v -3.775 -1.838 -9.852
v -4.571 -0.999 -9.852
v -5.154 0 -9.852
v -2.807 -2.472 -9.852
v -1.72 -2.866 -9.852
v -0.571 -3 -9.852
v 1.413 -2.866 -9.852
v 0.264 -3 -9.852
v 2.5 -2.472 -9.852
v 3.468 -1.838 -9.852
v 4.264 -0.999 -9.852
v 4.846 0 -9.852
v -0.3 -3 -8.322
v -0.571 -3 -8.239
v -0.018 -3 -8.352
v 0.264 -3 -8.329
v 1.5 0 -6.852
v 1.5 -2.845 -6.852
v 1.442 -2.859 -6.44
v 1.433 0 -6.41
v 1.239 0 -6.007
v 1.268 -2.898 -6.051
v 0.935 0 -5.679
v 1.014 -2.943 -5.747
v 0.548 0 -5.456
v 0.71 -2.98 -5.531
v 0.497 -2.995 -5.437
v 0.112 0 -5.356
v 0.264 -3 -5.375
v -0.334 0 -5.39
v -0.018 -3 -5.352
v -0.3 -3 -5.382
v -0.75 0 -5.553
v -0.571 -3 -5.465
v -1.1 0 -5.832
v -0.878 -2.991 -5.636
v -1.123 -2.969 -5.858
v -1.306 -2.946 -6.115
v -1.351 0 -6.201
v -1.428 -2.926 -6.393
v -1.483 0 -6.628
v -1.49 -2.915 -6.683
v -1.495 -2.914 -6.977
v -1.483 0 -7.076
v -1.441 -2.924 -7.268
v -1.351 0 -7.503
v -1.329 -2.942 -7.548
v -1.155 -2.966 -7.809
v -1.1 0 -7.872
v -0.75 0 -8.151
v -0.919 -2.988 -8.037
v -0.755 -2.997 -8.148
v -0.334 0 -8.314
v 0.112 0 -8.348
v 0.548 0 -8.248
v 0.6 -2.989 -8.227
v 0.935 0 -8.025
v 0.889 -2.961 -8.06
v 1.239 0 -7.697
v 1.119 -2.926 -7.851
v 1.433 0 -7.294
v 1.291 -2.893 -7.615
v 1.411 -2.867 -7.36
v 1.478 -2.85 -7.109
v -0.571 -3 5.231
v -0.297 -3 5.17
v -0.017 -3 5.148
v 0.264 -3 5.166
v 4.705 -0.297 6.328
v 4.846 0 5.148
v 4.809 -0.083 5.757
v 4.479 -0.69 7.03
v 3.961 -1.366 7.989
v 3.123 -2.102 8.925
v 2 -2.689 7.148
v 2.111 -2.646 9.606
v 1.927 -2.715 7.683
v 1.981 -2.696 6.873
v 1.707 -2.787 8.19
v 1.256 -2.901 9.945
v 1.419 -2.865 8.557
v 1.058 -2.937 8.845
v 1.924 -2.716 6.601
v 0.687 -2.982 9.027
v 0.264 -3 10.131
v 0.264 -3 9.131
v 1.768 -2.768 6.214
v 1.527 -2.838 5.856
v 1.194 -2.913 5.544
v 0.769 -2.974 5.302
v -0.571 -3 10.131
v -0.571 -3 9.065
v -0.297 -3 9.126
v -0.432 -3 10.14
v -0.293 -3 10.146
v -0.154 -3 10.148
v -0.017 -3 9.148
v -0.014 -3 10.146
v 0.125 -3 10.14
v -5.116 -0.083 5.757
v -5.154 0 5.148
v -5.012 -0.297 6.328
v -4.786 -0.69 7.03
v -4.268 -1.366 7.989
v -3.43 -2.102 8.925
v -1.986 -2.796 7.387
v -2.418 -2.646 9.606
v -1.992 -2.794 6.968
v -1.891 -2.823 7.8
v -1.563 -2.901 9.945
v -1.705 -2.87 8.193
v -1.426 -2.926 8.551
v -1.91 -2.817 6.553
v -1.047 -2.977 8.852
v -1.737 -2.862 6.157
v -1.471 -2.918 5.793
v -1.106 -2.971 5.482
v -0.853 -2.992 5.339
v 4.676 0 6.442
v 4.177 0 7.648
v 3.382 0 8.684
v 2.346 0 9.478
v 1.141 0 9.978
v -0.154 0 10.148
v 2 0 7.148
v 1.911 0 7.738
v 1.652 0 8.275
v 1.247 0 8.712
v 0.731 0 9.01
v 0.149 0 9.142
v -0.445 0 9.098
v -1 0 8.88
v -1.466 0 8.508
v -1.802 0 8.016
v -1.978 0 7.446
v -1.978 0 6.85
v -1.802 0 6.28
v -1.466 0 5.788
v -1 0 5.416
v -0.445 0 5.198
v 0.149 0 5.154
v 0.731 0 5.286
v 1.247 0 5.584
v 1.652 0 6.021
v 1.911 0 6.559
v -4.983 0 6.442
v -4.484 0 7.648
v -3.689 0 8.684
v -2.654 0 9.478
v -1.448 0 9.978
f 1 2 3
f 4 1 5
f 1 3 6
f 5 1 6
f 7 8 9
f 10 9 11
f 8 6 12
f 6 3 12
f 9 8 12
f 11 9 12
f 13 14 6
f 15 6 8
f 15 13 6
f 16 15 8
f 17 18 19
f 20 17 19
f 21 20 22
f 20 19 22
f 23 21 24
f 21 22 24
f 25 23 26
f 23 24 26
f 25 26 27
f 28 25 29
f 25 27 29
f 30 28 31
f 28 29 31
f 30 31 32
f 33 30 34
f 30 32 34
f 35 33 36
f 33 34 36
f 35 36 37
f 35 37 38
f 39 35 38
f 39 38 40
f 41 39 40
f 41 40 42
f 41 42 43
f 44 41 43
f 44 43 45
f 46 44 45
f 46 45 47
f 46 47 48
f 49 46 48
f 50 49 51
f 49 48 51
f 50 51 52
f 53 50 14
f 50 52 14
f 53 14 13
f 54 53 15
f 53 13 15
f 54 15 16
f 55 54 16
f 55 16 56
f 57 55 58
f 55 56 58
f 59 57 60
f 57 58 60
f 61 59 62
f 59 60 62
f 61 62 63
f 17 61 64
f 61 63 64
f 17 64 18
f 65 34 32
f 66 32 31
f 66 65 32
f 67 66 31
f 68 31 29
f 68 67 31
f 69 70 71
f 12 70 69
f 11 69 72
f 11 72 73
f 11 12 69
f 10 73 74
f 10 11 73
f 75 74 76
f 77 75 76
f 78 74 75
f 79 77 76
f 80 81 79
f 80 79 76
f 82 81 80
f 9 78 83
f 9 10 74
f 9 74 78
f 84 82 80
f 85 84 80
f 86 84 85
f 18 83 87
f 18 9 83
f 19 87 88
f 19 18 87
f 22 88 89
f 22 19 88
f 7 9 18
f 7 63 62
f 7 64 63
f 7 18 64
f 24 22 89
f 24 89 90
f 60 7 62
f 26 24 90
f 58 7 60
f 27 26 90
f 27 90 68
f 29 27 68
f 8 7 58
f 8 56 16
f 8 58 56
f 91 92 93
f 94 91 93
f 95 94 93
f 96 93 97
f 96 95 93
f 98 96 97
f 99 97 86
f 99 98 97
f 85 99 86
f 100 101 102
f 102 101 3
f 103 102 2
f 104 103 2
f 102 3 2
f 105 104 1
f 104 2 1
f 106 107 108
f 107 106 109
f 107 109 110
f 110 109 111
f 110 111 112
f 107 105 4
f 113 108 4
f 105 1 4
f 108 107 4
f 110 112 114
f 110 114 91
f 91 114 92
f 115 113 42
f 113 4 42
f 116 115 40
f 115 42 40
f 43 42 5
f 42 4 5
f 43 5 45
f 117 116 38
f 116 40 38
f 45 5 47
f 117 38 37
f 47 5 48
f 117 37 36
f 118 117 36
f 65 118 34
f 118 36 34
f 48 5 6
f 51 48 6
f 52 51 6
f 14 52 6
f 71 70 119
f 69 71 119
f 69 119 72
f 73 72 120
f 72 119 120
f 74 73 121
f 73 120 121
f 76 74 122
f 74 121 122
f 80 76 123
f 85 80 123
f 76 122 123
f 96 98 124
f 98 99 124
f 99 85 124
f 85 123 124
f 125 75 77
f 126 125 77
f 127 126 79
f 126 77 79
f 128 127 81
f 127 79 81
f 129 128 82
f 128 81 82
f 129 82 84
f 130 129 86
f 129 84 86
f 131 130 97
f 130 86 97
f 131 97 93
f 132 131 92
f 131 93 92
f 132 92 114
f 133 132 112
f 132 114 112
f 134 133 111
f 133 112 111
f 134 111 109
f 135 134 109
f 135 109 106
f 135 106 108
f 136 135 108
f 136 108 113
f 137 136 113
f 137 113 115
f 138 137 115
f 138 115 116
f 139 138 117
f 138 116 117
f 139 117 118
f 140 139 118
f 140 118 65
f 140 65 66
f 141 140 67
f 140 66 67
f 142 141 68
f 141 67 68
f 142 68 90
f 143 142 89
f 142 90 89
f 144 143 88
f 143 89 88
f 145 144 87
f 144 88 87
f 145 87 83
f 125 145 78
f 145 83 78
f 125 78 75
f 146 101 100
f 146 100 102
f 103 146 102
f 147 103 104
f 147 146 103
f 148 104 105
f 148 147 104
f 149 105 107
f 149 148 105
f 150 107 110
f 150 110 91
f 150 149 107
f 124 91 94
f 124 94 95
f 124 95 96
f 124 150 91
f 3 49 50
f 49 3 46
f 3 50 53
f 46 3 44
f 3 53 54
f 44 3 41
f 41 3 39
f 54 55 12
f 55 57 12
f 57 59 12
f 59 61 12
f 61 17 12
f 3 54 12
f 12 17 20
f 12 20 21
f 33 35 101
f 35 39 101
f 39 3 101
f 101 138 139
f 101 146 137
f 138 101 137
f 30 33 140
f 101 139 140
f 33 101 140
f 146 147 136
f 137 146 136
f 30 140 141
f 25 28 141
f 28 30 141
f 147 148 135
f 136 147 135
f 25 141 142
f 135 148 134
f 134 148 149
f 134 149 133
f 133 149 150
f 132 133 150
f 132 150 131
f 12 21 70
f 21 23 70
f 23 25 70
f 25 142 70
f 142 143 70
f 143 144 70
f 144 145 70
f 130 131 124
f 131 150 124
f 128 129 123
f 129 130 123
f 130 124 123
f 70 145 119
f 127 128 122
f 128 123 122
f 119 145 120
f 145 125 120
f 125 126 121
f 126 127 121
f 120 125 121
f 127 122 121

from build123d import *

# Parameters (mm, degrees)
F0_W        = 10
F0_H        = 20
F1_DEPTH    = 3
F2_R        = 2
F2_R_2      = 1.5
F3_DEPTH    = 3.001
F4_T1_DEPTH = 28
F4_T3_DEPTH = 42.9128784748


# Not quite as in the source:
# - a fillet or chamfer that OpenCascade refuses, or shapes differently, is made with other operations: its cross-section is extruded or revolved along the edge and cut away or added


with BuildPart() as f1:
    # F0 (on Front) → F1 (new body)
    with BuildSketch(Plane.XZ):
        with Locations((-0.1535092495, 0.14802441)):
            Rectangle(F0_W, F0_H)
    extrude(amount=F1_DEPTH)

    # F2 (on face) → F3 (cut, through all)
    with BuildSketch(Plane.XZ.offset(3)):
        with Locations((0, 7.14802441)):
            Circle(F2_R)
        with Locations((0, -6.85197559)):
            Circle(F2_R_2)
    extrude(amount=-F3_DEPTH, mode=Mode.SUBTRACT)

    # F4: fillet of radius 5 on 4 edges, made by hand

    # F4_s2 → F4_t1 (cut)
    with BuildSketch(Plane.XZ.offset(-12.5)):
        with BuildLine():
            ThreePointArc((4.8464907505, 5.14802441), (3.3820246565, 8.6835583159), (-0.1535092495, 10.14802441))
            Line((-0.1535092495, 10.14802441), (4.8464907505, 10.14802441))
            Line((4.8464907505, 10.14802441), (4.8464907505, 5.14802441))
        make_face()
        with BuildLine():
            ThreePointArc((-5.1535092495, 5.14802441), (-3.6890431554, 8.6835583159), (-0.1535092495, 10.14802441))
            Line((-0.1535092495, 10.14802441), (-5.1535092495, 10.14802441))
            Line((-5.1535092495, 10.14802441), (-5.1535092495, 5.14802441))
        make_face()
    extrude(amount=F4_T1_DEPTH, mode=Mode.SUBTRACT)

    # F4_s4 → F4_t3 (cut)
    with BuildSketch(Plane.XY.offset(-21.3084148274)):
        with BuildLine():
            ThreePointArc((-5.1535092495, 0), (-3.309546342, -2.1833001327), (-0.5709335545, -3))
            Line((-0.5709335545, -3), (-5.1535092495, -3))
            Line((-5.1535092495, -3), (-5.1535092495, 0))
        make_face()
        with BuildLine():
            ThreePointArc((4.8464907505, 0), (3.0025278431, -2.1833001327), (0.2639150556, -3))
            Line((0.2639150556, -3), (4.8464907505, -3))
            Line((4.8464907505, -3), (4.8464907505, 0))
        make_face()
    extrude(amount=F4_T3_DEPTH, mode=Mode.SUBTRACT)


solid = f1.part
